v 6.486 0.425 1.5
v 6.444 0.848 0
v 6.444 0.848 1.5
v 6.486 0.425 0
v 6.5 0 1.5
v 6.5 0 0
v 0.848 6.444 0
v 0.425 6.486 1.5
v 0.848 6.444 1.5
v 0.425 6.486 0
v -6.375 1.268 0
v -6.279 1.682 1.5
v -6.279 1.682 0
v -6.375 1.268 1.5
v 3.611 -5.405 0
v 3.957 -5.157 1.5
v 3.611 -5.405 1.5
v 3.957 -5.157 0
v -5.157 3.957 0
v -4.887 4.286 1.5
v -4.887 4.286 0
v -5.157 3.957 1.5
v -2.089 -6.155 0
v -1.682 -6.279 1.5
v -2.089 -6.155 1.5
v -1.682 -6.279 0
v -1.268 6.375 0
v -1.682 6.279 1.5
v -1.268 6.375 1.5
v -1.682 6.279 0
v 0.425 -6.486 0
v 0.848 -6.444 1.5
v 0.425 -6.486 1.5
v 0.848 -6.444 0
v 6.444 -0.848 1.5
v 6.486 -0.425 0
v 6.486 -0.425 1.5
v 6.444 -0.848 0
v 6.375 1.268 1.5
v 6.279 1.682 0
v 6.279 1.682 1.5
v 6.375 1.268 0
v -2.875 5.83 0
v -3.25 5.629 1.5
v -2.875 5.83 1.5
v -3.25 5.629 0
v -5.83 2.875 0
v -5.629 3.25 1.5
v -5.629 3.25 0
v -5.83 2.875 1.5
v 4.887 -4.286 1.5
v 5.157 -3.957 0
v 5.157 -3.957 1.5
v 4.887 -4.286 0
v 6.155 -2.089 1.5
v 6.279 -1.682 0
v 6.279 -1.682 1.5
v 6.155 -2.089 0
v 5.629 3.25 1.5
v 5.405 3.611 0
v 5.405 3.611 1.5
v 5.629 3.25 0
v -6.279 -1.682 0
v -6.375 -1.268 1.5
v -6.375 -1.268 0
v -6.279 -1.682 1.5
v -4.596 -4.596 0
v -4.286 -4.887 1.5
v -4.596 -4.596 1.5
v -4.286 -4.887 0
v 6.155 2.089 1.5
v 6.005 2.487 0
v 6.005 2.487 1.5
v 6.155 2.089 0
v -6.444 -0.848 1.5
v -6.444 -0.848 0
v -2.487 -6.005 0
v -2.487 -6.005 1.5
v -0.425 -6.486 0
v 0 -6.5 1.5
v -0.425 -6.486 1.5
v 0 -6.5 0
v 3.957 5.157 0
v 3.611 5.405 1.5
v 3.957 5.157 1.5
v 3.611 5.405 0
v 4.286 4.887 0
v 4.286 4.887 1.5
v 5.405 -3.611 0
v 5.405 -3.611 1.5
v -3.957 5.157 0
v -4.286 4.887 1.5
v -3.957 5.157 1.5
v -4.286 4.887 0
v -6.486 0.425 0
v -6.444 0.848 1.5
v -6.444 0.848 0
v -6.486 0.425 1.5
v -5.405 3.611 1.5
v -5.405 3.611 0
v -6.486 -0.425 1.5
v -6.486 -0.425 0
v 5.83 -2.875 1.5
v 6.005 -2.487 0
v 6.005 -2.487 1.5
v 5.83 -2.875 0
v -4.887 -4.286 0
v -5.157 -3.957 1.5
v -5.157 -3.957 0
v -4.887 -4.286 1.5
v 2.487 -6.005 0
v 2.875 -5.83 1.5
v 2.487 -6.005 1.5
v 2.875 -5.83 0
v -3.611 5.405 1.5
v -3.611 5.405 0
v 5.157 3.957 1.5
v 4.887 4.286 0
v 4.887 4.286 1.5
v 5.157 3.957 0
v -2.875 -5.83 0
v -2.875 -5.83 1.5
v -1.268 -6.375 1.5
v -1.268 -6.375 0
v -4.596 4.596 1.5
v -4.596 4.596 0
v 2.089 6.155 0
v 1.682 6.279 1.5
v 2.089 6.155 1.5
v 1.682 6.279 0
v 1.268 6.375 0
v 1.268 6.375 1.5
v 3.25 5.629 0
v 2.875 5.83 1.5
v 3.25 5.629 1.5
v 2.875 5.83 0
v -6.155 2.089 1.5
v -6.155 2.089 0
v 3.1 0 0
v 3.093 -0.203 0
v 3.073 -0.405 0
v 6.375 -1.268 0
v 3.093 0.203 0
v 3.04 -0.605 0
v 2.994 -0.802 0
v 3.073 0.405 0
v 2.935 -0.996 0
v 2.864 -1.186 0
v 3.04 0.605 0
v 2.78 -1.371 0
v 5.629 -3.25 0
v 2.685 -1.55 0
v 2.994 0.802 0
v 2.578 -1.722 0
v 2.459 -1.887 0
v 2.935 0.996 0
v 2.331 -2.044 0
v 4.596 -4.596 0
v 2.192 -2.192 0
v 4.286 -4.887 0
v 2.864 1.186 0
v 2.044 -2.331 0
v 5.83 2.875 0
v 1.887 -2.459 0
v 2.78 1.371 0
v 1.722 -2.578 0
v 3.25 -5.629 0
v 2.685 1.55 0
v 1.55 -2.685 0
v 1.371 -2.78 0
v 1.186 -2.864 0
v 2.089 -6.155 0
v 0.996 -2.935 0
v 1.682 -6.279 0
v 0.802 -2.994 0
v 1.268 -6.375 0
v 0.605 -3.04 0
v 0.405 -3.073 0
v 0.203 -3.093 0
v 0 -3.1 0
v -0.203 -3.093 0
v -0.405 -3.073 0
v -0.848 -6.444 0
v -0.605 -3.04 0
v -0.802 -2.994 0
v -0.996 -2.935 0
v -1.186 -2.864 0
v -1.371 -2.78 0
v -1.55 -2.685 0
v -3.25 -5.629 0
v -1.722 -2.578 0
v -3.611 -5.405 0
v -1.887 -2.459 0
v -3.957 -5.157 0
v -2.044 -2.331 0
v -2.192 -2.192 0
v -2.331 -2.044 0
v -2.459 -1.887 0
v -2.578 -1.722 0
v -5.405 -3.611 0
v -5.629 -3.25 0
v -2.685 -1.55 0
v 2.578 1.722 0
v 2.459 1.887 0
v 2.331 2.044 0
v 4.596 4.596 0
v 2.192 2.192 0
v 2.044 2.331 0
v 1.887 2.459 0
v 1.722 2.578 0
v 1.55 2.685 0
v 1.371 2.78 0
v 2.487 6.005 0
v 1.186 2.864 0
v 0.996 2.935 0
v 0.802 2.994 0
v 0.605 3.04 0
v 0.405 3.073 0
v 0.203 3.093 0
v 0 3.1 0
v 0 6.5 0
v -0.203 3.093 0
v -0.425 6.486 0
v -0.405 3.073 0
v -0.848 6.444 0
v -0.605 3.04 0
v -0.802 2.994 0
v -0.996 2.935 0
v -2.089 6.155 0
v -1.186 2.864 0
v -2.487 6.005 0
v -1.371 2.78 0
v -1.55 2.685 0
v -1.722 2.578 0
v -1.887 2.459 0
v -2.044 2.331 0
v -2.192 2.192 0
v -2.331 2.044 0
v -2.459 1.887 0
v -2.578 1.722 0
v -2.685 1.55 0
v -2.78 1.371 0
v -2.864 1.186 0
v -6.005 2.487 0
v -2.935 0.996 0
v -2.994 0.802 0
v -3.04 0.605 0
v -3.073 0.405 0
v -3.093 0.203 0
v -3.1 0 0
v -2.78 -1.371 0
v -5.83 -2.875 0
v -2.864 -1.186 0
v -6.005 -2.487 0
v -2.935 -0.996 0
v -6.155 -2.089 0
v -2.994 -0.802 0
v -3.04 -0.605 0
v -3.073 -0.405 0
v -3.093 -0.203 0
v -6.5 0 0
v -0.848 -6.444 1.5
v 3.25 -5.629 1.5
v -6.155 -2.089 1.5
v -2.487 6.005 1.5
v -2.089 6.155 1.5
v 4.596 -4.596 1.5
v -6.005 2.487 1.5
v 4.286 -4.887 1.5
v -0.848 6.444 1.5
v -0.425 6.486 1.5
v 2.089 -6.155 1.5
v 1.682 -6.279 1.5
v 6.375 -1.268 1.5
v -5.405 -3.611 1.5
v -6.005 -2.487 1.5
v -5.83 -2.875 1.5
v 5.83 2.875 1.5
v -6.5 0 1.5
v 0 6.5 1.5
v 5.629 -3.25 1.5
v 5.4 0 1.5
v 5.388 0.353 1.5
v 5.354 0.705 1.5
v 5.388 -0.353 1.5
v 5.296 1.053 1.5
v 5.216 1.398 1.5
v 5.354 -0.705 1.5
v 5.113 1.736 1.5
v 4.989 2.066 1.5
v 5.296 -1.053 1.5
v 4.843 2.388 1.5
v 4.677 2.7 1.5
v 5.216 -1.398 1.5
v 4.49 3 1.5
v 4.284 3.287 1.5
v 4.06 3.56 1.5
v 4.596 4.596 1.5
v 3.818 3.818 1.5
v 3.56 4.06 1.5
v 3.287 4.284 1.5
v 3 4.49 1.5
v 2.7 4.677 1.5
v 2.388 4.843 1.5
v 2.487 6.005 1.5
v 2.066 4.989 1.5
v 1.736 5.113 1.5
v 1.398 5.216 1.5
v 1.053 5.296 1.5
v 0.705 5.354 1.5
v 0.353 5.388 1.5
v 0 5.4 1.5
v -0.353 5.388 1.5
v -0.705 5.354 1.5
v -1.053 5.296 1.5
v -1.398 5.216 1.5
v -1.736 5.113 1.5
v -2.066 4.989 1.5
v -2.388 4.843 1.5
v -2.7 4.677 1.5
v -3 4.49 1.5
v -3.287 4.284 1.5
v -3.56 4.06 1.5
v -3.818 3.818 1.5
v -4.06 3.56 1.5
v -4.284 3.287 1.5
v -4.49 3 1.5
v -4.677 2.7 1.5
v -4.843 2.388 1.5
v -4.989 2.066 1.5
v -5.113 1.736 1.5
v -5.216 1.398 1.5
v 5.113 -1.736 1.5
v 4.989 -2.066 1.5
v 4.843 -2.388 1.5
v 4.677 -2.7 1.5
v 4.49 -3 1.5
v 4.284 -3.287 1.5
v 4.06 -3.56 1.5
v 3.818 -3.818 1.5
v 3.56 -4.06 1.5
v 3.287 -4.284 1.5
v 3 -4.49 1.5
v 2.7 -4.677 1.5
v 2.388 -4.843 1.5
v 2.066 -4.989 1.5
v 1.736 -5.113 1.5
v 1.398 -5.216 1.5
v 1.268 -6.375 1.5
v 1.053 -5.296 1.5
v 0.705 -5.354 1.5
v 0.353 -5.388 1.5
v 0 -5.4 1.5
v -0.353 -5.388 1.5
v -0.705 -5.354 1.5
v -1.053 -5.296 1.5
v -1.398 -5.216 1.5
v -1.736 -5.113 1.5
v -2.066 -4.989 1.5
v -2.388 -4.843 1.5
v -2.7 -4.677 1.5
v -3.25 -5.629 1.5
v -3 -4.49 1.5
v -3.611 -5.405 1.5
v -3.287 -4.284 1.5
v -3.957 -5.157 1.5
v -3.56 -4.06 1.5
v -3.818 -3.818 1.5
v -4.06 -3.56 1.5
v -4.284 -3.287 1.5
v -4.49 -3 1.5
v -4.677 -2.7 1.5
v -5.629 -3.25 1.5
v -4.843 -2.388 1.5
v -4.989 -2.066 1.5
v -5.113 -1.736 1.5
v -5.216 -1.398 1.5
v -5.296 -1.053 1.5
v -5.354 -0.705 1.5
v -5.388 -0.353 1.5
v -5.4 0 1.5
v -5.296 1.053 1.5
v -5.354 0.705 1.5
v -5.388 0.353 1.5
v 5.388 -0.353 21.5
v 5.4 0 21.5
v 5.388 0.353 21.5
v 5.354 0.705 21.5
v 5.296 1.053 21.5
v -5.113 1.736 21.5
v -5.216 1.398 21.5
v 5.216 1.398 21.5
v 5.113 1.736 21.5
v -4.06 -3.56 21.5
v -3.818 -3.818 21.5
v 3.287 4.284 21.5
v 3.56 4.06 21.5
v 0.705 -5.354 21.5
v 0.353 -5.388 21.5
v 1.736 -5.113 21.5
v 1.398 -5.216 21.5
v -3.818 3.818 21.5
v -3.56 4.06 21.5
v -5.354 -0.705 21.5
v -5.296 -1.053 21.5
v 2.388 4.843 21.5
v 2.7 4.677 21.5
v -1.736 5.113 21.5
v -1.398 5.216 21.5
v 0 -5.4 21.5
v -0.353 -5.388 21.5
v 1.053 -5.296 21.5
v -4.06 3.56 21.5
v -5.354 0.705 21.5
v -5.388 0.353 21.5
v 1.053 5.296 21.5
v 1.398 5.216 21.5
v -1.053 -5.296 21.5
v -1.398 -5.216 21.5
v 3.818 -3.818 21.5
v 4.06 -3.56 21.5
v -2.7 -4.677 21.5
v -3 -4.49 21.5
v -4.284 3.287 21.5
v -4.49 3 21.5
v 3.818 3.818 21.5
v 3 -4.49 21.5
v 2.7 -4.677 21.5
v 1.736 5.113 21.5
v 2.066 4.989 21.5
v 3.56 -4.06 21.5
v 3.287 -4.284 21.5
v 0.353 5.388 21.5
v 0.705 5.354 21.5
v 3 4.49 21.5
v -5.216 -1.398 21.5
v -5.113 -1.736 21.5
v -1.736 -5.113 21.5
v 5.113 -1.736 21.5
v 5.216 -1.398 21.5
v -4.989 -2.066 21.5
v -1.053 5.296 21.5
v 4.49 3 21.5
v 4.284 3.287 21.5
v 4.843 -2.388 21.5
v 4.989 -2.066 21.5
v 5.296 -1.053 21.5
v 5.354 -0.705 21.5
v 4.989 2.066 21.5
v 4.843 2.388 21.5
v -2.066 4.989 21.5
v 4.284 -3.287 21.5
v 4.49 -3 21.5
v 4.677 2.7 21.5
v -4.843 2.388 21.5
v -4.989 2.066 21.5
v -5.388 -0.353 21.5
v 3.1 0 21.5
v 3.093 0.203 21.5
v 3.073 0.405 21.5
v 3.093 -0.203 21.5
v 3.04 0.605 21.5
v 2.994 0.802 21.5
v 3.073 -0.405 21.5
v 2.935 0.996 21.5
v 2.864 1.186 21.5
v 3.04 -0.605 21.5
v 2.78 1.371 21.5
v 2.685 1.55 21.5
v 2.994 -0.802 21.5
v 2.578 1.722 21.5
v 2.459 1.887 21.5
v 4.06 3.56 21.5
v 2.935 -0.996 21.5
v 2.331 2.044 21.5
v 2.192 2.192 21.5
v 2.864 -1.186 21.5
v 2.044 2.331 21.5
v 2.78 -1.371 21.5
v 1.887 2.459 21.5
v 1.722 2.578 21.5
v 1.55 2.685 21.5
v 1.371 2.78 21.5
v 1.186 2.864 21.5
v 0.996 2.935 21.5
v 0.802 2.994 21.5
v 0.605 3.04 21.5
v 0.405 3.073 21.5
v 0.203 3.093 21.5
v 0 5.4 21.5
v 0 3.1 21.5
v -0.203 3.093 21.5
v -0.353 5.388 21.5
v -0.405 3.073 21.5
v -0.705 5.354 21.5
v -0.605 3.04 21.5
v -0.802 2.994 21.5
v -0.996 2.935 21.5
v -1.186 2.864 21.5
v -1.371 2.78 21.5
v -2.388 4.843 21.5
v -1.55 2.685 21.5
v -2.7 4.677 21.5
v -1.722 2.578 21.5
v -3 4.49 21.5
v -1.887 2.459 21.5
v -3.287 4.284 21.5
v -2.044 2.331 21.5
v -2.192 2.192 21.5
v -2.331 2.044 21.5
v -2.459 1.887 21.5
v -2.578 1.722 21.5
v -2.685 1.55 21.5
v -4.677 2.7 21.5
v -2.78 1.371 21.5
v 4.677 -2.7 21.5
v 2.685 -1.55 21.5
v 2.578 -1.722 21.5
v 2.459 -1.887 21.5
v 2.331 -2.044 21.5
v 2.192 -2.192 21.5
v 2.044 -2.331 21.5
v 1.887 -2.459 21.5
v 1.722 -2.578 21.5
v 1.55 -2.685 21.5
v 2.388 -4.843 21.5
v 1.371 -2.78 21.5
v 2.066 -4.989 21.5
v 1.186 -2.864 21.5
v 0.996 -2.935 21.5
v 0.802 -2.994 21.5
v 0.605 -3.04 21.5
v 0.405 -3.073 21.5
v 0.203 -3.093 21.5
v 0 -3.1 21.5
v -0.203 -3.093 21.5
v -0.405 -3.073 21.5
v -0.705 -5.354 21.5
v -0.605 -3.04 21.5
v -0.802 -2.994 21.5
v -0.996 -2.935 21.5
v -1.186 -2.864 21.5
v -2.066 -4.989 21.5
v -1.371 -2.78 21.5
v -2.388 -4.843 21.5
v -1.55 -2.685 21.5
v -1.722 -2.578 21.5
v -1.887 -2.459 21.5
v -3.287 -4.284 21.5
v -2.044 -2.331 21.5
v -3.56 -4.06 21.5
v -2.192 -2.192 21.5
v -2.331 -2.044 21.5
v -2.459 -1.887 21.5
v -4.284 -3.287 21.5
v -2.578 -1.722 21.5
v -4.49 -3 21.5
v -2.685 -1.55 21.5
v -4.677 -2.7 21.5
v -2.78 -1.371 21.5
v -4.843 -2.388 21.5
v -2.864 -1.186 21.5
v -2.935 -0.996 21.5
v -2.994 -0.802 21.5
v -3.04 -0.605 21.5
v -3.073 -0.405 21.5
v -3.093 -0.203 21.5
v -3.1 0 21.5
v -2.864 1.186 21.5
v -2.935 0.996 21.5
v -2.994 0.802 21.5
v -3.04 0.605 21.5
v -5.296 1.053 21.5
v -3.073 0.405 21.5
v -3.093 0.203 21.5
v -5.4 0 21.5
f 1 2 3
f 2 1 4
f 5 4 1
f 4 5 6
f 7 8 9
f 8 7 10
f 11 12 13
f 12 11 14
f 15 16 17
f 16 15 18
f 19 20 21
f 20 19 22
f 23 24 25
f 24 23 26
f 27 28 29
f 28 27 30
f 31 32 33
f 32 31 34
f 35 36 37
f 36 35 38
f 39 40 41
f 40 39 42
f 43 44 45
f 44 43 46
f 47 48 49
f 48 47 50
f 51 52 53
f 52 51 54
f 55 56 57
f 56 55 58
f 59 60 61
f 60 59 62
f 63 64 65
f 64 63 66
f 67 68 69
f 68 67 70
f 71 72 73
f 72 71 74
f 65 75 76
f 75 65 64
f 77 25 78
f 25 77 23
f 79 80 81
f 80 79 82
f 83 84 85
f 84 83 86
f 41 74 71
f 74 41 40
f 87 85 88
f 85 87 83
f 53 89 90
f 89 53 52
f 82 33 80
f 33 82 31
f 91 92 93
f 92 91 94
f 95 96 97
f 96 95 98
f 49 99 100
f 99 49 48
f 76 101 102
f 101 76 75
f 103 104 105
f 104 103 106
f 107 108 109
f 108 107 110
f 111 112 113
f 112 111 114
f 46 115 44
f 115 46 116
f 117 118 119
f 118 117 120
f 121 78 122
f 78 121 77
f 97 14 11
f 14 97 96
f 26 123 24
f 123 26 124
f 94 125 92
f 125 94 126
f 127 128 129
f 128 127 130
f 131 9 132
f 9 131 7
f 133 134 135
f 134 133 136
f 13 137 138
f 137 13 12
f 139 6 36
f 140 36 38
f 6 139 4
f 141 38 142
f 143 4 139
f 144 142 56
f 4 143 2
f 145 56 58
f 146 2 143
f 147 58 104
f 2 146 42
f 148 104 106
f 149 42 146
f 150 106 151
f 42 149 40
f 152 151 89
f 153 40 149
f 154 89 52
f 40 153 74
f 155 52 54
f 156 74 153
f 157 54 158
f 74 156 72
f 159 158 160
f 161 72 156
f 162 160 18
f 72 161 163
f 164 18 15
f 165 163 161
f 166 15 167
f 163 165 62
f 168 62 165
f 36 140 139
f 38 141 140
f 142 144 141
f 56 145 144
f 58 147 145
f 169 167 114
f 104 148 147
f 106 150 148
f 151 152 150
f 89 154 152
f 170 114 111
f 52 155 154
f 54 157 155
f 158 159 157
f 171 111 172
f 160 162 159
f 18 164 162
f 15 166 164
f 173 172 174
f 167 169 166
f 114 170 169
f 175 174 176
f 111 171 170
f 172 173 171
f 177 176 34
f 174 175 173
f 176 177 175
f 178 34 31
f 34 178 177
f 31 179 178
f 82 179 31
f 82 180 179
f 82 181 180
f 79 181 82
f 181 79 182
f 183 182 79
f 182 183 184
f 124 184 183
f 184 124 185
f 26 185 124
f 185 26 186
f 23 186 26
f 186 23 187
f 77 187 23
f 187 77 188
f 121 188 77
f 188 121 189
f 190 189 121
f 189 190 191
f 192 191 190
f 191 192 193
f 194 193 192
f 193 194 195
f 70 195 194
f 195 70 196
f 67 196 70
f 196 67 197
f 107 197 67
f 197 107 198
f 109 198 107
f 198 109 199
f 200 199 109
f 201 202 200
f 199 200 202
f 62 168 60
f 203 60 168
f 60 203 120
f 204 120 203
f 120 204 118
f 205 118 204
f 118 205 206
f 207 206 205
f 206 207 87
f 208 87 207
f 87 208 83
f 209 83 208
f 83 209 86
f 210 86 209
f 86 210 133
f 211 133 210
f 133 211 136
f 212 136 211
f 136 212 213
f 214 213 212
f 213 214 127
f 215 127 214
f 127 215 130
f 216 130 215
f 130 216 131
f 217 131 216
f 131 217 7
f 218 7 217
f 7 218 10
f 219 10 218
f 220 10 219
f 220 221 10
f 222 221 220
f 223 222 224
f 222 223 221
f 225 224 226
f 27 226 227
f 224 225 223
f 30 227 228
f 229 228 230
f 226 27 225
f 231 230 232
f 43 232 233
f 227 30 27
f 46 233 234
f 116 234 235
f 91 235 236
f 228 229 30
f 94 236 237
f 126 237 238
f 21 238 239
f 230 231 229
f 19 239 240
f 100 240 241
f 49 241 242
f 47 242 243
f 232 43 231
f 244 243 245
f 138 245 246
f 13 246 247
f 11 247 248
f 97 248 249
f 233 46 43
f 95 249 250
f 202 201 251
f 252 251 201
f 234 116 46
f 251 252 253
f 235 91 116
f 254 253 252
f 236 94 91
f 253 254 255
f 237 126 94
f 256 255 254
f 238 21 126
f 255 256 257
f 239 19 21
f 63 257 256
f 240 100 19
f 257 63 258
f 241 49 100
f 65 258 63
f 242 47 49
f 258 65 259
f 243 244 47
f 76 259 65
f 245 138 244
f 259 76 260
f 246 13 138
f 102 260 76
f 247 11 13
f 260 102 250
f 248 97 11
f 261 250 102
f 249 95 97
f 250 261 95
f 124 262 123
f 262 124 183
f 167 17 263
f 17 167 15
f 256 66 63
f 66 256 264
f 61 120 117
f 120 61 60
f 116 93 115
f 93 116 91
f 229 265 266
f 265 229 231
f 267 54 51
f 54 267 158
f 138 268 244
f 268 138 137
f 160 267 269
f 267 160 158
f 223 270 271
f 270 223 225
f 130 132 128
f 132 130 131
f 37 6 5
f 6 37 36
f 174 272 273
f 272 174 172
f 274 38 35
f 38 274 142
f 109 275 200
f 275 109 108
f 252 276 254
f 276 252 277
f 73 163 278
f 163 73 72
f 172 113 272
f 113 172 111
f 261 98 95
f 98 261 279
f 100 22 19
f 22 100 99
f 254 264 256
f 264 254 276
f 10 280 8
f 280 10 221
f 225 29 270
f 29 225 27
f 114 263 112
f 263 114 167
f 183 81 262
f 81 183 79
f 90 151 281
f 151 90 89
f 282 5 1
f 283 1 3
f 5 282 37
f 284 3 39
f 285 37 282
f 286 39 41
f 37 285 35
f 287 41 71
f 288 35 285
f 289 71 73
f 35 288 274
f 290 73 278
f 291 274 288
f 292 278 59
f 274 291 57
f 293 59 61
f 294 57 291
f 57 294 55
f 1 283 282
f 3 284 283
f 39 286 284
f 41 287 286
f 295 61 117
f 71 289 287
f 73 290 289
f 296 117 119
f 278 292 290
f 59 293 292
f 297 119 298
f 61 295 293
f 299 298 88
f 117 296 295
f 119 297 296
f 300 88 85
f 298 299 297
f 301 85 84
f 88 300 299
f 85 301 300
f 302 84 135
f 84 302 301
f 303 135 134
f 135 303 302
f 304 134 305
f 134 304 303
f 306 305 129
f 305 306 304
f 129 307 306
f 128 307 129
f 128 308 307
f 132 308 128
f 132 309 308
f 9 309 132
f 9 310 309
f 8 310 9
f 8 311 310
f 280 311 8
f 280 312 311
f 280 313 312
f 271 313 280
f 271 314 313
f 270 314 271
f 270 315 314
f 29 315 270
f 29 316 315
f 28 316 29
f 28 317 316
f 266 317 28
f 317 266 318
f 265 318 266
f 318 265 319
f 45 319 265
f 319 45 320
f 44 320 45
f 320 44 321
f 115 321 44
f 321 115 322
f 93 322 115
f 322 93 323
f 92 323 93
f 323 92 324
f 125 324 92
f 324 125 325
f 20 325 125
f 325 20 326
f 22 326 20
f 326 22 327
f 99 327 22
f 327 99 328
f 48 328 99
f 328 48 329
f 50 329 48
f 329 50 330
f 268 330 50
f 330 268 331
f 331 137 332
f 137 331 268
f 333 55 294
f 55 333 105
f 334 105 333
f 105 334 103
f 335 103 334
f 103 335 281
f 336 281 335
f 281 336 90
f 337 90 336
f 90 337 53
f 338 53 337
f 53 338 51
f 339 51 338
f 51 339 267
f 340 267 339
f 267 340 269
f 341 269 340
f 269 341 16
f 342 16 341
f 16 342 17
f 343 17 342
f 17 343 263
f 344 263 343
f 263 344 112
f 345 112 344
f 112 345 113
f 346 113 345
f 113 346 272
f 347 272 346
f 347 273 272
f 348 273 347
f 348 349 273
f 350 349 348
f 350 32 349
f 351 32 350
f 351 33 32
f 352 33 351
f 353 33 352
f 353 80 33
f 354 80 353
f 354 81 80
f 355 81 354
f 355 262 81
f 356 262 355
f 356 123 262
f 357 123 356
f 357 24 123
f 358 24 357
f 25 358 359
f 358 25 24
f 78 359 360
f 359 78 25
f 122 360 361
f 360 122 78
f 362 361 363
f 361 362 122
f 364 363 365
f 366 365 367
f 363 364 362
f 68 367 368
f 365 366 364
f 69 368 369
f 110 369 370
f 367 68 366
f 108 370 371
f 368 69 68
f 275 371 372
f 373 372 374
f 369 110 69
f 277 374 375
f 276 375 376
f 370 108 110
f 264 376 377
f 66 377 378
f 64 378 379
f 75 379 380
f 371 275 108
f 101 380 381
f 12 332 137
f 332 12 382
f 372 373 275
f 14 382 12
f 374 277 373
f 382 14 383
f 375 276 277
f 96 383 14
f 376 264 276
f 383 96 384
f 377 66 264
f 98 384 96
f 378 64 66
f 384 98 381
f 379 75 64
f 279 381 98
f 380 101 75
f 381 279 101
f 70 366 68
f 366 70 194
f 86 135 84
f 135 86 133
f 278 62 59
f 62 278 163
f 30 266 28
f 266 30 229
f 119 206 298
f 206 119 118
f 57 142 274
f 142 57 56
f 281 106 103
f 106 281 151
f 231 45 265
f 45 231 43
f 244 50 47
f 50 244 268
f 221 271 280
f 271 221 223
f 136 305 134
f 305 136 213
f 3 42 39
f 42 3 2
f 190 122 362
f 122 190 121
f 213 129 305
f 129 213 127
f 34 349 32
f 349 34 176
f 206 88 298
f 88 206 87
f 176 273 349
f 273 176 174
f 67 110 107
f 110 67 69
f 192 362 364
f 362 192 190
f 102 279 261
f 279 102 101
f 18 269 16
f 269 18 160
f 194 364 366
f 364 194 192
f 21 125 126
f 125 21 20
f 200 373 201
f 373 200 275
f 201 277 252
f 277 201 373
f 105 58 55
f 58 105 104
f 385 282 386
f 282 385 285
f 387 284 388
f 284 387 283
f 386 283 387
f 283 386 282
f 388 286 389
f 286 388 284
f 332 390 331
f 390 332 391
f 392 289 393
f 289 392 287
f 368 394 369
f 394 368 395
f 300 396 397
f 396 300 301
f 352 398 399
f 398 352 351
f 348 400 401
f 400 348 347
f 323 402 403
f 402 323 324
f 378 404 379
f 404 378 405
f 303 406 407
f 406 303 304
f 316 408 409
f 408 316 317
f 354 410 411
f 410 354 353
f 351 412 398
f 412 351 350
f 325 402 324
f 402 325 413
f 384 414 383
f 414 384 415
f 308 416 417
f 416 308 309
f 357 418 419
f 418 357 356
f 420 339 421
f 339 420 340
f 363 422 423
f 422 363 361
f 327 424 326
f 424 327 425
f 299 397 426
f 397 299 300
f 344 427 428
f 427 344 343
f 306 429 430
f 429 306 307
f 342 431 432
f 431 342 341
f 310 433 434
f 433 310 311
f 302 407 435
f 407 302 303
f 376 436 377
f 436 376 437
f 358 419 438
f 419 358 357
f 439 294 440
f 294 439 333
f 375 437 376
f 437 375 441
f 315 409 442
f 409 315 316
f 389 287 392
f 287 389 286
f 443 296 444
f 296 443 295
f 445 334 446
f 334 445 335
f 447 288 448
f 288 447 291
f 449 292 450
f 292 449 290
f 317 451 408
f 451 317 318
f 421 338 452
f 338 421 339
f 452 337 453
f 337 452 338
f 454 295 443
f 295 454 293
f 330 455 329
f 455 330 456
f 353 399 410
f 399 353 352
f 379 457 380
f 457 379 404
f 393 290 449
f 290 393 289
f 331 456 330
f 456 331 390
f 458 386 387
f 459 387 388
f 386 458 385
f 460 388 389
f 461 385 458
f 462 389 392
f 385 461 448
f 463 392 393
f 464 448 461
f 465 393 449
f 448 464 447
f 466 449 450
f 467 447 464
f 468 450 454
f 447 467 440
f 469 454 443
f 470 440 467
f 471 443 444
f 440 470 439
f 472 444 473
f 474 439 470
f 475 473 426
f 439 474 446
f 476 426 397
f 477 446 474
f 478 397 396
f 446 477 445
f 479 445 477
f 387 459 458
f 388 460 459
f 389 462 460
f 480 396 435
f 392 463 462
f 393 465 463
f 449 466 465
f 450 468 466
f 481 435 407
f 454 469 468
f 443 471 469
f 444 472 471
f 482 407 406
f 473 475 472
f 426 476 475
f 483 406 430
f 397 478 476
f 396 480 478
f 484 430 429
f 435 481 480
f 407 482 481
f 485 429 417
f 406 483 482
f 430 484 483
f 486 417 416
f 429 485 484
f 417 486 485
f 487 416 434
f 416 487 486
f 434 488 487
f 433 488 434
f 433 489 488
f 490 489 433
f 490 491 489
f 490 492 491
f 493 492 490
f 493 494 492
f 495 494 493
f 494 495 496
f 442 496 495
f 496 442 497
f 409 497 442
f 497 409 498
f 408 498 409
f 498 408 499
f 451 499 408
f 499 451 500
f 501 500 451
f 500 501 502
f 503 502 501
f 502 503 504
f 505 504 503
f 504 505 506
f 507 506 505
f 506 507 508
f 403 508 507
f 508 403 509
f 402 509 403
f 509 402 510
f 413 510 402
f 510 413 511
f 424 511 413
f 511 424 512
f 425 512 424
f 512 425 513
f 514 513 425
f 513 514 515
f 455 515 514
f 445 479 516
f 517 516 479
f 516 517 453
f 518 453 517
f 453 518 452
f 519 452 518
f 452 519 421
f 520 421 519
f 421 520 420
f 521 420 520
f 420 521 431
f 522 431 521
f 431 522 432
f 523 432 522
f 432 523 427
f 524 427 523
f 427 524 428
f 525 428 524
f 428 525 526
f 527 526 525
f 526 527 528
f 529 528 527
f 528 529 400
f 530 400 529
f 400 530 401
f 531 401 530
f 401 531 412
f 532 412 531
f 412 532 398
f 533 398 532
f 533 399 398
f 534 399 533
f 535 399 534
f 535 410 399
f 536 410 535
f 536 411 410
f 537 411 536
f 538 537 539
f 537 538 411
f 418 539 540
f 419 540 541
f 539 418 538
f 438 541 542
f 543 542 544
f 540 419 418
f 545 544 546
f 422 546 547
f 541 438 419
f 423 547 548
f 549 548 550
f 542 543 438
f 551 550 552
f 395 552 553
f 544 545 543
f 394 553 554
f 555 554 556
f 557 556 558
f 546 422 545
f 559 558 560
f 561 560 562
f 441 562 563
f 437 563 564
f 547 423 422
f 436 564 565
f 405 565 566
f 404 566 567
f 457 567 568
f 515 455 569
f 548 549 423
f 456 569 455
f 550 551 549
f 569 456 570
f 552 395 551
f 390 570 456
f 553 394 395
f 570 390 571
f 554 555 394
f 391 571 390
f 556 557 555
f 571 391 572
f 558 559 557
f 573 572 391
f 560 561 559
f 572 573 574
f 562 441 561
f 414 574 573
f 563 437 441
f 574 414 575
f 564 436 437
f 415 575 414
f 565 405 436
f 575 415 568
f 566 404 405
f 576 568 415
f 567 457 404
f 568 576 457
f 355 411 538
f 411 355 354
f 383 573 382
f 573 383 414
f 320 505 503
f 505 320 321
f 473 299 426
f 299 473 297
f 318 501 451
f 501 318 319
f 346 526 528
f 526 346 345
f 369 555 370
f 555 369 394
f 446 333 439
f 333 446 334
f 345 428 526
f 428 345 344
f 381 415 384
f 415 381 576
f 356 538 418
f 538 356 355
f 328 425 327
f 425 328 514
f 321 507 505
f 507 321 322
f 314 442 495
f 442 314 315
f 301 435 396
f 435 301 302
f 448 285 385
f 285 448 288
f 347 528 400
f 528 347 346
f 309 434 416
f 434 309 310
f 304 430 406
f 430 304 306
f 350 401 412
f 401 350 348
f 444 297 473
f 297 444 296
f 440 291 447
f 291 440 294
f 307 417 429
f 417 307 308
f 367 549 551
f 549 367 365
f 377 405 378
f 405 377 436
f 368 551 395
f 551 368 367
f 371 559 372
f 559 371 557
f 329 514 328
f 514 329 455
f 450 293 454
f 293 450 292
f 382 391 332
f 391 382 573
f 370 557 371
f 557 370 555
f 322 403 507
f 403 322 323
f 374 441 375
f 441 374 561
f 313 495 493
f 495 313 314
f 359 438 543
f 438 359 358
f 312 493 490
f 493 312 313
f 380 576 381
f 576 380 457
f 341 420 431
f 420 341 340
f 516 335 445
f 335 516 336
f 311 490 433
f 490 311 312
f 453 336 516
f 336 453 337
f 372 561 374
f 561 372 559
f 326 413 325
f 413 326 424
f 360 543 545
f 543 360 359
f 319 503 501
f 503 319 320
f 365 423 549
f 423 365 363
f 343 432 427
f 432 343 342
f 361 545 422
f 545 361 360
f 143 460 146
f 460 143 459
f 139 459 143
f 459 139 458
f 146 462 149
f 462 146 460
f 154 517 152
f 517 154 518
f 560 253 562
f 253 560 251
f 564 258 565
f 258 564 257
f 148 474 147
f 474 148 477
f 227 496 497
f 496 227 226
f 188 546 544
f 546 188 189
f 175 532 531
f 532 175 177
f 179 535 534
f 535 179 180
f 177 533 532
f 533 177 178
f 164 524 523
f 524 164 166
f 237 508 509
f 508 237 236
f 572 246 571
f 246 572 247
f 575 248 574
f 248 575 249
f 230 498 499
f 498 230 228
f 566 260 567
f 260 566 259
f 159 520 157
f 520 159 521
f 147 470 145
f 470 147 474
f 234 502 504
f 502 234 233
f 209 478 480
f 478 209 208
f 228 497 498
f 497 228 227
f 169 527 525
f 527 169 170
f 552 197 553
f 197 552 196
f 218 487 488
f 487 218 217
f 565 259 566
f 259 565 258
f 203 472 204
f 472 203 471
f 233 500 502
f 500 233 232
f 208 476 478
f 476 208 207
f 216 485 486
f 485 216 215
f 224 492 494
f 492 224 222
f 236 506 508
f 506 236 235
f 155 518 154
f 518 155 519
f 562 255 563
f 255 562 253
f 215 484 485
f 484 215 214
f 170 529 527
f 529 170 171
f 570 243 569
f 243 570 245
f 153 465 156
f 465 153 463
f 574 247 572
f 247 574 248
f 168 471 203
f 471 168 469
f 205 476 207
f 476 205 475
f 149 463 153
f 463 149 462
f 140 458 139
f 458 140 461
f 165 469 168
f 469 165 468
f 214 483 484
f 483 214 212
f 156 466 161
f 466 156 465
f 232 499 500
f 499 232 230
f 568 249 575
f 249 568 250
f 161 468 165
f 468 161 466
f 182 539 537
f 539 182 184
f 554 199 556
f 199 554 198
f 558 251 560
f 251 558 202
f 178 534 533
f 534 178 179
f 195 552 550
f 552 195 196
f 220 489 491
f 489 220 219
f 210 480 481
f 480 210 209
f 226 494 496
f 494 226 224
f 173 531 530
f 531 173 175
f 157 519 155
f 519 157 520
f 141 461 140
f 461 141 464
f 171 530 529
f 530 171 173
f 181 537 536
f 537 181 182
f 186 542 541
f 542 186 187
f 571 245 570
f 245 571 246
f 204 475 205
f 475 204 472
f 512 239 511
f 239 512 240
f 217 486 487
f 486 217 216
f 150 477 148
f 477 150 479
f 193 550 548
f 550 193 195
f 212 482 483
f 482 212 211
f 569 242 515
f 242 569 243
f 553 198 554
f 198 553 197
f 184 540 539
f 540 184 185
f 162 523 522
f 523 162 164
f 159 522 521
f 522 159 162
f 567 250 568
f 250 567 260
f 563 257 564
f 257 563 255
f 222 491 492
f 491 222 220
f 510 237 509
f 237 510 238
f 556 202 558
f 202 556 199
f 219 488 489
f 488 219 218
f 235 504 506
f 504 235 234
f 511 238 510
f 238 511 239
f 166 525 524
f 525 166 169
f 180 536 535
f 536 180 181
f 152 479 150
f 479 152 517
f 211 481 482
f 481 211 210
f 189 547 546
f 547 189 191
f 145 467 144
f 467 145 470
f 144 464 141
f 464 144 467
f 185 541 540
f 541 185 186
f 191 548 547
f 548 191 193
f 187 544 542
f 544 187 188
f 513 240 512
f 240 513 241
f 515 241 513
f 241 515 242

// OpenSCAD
// PCR tube adapter sleeve: fits 0.2 mL tubes into 1.5 mL rack holes
// Print orientation: collar on bed (z = 0), sleeve body rises to z = 21.5

// ---- Dimensions (mm) ----
collar_d        = 13;    // collar outer diameter
collar_h        = 1.5;   // collar thickness (z = 0 to 1.5)
sleeve_od       = 10.8;  // sleeve body outer diameter
sleeve_top_z    = 21.5;  // top of sleeve body
bore_d          = 6.2;   // through-bore diameter
eps             = 0.5;   // cutter overshoot past faces

$fn = 96;

difference() {
    union() {
        // Collar
        cylinder(d = collar_d, h = collar_h);
        // Sleeve body (slightly overlapping collar for a clean union)
        translate([0, 0, collar_h - 0.01])
            cylinder(d = sleeve_od, h = sleeve_top_z - collar_h + 0.01);
    }
    // Full-height bore, open at both ends
    translate([0, 0, -eps])
        cylinder(d = bore_d, h = sleeve_top_z + 2 * eps);
}
